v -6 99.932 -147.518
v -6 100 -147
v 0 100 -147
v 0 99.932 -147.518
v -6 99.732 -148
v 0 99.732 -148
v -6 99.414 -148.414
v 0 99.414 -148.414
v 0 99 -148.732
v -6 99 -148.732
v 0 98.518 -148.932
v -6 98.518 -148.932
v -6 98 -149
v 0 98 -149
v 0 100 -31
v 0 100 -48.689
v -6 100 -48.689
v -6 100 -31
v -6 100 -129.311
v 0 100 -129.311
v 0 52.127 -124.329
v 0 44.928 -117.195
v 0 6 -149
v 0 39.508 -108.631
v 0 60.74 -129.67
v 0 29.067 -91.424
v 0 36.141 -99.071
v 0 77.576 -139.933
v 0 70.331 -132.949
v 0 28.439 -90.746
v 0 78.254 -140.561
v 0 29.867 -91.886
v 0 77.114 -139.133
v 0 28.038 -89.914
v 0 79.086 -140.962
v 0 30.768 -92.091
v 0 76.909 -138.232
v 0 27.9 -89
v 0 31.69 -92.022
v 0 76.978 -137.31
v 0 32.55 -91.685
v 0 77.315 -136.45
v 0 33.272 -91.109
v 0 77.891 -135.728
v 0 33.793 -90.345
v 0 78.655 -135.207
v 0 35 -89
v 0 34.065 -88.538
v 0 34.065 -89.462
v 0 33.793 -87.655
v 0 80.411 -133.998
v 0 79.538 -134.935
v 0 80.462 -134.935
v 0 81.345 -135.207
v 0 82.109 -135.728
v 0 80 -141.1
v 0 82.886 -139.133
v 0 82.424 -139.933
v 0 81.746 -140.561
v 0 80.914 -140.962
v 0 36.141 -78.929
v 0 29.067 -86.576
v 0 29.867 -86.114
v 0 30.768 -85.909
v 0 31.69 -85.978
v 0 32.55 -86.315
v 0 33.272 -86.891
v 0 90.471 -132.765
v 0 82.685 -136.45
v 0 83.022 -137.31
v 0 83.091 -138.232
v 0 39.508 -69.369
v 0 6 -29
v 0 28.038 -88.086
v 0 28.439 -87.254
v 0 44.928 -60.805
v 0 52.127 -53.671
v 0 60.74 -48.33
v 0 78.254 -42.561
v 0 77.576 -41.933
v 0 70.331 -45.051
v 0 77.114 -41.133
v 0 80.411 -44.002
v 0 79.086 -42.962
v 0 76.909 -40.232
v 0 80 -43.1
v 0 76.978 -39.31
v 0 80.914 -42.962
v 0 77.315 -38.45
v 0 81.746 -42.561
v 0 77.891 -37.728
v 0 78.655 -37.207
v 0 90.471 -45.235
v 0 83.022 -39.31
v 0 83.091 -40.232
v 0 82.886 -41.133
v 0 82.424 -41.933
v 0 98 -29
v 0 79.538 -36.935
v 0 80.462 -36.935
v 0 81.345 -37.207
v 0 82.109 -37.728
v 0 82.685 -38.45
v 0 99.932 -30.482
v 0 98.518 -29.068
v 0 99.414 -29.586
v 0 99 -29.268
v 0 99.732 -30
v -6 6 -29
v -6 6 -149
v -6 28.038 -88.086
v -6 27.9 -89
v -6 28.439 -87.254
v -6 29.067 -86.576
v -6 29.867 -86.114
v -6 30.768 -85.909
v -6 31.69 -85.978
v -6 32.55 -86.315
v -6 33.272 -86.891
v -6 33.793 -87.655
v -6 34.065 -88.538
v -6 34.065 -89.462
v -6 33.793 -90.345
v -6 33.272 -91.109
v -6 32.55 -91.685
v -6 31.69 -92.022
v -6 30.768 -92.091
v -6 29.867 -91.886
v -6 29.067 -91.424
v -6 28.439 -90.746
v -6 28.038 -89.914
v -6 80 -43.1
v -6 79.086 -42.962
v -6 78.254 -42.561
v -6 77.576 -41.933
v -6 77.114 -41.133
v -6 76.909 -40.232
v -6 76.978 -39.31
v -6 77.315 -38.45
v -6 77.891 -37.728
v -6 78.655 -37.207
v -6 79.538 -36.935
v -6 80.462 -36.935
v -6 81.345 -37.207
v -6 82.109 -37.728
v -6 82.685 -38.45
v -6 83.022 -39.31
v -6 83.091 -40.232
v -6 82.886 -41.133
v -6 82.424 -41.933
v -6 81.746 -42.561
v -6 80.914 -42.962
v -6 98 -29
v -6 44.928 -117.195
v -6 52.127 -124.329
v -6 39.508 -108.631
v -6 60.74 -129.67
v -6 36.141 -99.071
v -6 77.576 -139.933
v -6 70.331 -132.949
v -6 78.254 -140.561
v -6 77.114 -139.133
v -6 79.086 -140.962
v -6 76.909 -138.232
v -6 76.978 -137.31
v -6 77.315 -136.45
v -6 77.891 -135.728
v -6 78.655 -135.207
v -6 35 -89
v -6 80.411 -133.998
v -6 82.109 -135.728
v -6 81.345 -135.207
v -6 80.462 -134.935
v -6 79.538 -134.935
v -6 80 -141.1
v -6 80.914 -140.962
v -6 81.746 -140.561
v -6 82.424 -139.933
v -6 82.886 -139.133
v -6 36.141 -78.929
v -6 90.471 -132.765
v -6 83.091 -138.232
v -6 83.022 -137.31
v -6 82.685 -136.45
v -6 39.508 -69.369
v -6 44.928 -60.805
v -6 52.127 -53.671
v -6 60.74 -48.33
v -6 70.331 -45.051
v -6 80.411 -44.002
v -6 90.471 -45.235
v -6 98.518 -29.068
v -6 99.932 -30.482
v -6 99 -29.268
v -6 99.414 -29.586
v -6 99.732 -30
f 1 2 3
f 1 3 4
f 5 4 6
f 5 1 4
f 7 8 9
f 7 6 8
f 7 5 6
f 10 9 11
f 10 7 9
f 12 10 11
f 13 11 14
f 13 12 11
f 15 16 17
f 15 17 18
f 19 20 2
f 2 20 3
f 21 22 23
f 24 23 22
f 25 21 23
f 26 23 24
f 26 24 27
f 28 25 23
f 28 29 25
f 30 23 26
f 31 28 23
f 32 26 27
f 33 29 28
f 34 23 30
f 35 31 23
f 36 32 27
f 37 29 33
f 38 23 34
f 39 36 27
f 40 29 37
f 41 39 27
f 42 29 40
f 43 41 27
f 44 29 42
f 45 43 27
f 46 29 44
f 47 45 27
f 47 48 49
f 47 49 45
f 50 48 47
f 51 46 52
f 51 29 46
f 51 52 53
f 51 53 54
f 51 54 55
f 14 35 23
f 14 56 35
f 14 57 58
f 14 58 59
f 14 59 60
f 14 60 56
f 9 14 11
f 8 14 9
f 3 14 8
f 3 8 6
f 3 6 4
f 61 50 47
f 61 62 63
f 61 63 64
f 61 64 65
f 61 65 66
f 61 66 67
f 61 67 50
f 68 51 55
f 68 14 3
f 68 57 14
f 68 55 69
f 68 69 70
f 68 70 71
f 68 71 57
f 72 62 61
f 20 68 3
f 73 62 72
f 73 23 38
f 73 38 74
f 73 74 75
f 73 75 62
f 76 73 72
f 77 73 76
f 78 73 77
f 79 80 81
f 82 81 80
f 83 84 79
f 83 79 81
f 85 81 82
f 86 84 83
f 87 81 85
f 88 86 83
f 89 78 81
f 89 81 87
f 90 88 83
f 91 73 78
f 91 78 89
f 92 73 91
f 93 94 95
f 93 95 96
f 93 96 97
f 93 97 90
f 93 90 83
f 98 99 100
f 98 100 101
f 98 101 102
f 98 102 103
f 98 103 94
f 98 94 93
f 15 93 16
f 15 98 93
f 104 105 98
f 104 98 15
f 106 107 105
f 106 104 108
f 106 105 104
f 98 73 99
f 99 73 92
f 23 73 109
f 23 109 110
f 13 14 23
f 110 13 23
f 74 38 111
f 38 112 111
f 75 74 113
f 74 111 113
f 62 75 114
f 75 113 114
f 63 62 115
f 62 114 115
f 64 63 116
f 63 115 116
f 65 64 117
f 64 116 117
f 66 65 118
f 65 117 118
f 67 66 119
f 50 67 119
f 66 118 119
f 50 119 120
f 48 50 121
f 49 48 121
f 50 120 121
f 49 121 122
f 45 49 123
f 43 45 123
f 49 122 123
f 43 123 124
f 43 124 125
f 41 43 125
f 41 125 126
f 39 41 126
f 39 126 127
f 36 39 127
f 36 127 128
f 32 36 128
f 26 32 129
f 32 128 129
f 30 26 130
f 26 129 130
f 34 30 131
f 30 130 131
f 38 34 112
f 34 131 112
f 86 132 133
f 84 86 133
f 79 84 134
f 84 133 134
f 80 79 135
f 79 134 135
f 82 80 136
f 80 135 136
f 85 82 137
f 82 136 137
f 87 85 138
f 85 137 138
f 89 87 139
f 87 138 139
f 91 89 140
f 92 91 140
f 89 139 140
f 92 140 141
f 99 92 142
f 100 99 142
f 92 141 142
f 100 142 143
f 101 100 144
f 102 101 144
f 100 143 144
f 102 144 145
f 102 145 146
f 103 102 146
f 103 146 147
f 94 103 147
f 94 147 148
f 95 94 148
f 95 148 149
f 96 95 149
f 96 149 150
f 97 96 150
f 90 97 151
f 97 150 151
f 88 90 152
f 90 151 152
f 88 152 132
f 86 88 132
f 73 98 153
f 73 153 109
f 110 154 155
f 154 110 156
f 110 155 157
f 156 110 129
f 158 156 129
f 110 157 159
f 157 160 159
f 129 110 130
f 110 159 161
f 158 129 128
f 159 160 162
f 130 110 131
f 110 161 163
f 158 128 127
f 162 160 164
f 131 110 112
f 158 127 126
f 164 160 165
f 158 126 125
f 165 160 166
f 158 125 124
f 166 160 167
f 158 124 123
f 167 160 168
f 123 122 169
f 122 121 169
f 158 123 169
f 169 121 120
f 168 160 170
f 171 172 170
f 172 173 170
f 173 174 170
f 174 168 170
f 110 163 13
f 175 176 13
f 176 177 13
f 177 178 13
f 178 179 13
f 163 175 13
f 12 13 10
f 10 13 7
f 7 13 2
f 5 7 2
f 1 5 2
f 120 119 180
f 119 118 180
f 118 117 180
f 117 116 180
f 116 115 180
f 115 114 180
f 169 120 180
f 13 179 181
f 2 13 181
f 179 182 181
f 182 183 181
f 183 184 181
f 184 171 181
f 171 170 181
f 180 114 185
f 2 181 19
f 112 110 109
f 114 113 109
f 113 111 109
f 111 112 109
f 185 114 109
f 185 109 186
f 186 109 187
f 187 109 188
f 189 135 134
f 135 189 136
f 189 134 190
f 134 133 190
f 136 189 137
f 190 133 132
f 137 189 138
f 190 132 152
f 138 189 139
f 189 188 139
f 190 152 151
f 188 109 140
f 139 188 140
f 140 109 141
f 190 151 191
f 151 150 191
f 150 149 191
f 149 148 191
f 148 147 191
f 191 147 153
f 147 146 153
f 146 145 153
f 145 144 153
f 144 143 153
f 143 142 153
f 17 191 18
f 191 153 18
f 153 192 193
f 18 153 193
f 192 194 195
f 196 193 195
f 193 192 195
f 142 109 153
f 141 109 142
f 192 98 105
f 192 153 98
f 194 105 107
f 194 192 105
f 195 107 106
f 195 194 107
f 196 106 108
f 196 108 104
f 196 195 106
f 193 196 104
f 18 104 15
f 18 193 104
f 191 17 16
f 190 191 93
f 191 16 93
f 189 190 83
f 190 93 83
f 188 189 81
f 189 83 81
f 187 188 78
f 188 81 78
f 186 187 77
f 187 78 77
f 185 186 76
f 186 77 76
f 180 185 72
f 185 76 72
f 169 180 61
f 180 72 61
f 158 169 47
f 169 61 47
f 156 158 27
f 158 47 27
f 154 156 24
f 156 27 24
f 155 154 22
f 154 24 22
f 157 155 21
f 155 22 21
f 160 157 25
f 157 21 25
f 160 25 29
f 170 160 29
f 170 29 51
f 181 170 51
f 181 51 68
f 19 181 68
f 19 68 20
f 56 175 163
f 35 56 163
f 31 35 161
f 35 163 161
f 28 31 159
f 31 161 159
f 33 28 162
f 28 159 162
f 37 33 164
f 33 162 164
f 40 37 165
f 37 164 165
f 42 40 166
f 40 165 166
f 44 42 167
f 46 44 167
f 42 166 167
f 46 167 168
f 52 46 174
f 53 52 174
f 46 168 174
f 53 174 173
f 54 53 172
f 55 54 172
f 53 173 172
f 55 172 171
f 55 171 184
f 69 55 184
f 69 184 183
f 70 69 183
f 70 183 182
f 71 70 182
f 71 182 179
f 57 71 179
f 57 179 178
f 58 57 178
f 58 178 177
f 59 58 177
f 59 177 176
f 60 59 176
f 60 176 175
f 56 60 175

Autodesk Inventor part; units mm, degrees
ref_plane "YZ Plane" through (0, 0, 0) normal (1, 0, 0) x (0, 1, 0)
ref_plane "XZ Plane" through (0, 0, 0) normal (0, 1, 0) x (-1, 0, 0)
ref_plane "XY Plane" through (0, 0, 0) normal (0, 0, 1) x (1, 0, 0)
sketch "Szkic1" plane through (0, 0, 0) normal (1, 0, 0) x (0, 1, 0)
  line L0 (0, 0) -> (6, 0)
  line L1 (6, 0) -> (6, -178)
  line L2 (6, -178) -> (0, -178)
  line L3 (0, -178) -> (0, 0)
  line L4 (0, -89) -> (100, -89)
  line L5 (100, -129.3113) -> (100, -149)
  line L6 (100, -149) -> (6, -149)
  line L7 (100, -48.6887) -> (100, -29)
  line L8 (100, -29) -> (6, -29)
  line L9 (100, -89) -> (80, -89)
  arc A0 (100, -48.6887) -> (100, -129.3113) centre (80, -89) ccw
  line L10 (80, -40) -> (80, -138)
  point P0 (6, -29)
  dimension "d0" = 6
  dimension "d1" = 178
  dimension "d2" = 100
  dimension "d3" = 60
  dimension "d4" = 20
  dimension "d5" = 90
  dimension "d6" = 98
extrude "Wyciągnięcie proste1" add sketch "Szkic1" against normal blind 6 contours L0 L1 L4 L3 | L4 L1 L2 L3 | L8 L7 A0 L4 L1 | L4 A0 L5 L6 L1
hole "Otwór1" at (0, 80, -40) at (0, 80, -138) direction (-1, 0, 0) diameter 6.2 depth 33 tip angle 118
pattern_circular "Szyk kołowy1" count 4 over 360 about axis through (0, 80, -89) along (-1, 0, 0) of "Otwór1"
fillet "Zaokrąglenie1" radius 2 2 edges at (-3, 100, -29) (-3, 100, -149)
extrude "Wyciągnięcie proste3" cut sketch "Szkic1" against normal blind 37.25 contours L0 L1 L4 L3 | L4 L1 L2 L3
properties part number "łapa1"
